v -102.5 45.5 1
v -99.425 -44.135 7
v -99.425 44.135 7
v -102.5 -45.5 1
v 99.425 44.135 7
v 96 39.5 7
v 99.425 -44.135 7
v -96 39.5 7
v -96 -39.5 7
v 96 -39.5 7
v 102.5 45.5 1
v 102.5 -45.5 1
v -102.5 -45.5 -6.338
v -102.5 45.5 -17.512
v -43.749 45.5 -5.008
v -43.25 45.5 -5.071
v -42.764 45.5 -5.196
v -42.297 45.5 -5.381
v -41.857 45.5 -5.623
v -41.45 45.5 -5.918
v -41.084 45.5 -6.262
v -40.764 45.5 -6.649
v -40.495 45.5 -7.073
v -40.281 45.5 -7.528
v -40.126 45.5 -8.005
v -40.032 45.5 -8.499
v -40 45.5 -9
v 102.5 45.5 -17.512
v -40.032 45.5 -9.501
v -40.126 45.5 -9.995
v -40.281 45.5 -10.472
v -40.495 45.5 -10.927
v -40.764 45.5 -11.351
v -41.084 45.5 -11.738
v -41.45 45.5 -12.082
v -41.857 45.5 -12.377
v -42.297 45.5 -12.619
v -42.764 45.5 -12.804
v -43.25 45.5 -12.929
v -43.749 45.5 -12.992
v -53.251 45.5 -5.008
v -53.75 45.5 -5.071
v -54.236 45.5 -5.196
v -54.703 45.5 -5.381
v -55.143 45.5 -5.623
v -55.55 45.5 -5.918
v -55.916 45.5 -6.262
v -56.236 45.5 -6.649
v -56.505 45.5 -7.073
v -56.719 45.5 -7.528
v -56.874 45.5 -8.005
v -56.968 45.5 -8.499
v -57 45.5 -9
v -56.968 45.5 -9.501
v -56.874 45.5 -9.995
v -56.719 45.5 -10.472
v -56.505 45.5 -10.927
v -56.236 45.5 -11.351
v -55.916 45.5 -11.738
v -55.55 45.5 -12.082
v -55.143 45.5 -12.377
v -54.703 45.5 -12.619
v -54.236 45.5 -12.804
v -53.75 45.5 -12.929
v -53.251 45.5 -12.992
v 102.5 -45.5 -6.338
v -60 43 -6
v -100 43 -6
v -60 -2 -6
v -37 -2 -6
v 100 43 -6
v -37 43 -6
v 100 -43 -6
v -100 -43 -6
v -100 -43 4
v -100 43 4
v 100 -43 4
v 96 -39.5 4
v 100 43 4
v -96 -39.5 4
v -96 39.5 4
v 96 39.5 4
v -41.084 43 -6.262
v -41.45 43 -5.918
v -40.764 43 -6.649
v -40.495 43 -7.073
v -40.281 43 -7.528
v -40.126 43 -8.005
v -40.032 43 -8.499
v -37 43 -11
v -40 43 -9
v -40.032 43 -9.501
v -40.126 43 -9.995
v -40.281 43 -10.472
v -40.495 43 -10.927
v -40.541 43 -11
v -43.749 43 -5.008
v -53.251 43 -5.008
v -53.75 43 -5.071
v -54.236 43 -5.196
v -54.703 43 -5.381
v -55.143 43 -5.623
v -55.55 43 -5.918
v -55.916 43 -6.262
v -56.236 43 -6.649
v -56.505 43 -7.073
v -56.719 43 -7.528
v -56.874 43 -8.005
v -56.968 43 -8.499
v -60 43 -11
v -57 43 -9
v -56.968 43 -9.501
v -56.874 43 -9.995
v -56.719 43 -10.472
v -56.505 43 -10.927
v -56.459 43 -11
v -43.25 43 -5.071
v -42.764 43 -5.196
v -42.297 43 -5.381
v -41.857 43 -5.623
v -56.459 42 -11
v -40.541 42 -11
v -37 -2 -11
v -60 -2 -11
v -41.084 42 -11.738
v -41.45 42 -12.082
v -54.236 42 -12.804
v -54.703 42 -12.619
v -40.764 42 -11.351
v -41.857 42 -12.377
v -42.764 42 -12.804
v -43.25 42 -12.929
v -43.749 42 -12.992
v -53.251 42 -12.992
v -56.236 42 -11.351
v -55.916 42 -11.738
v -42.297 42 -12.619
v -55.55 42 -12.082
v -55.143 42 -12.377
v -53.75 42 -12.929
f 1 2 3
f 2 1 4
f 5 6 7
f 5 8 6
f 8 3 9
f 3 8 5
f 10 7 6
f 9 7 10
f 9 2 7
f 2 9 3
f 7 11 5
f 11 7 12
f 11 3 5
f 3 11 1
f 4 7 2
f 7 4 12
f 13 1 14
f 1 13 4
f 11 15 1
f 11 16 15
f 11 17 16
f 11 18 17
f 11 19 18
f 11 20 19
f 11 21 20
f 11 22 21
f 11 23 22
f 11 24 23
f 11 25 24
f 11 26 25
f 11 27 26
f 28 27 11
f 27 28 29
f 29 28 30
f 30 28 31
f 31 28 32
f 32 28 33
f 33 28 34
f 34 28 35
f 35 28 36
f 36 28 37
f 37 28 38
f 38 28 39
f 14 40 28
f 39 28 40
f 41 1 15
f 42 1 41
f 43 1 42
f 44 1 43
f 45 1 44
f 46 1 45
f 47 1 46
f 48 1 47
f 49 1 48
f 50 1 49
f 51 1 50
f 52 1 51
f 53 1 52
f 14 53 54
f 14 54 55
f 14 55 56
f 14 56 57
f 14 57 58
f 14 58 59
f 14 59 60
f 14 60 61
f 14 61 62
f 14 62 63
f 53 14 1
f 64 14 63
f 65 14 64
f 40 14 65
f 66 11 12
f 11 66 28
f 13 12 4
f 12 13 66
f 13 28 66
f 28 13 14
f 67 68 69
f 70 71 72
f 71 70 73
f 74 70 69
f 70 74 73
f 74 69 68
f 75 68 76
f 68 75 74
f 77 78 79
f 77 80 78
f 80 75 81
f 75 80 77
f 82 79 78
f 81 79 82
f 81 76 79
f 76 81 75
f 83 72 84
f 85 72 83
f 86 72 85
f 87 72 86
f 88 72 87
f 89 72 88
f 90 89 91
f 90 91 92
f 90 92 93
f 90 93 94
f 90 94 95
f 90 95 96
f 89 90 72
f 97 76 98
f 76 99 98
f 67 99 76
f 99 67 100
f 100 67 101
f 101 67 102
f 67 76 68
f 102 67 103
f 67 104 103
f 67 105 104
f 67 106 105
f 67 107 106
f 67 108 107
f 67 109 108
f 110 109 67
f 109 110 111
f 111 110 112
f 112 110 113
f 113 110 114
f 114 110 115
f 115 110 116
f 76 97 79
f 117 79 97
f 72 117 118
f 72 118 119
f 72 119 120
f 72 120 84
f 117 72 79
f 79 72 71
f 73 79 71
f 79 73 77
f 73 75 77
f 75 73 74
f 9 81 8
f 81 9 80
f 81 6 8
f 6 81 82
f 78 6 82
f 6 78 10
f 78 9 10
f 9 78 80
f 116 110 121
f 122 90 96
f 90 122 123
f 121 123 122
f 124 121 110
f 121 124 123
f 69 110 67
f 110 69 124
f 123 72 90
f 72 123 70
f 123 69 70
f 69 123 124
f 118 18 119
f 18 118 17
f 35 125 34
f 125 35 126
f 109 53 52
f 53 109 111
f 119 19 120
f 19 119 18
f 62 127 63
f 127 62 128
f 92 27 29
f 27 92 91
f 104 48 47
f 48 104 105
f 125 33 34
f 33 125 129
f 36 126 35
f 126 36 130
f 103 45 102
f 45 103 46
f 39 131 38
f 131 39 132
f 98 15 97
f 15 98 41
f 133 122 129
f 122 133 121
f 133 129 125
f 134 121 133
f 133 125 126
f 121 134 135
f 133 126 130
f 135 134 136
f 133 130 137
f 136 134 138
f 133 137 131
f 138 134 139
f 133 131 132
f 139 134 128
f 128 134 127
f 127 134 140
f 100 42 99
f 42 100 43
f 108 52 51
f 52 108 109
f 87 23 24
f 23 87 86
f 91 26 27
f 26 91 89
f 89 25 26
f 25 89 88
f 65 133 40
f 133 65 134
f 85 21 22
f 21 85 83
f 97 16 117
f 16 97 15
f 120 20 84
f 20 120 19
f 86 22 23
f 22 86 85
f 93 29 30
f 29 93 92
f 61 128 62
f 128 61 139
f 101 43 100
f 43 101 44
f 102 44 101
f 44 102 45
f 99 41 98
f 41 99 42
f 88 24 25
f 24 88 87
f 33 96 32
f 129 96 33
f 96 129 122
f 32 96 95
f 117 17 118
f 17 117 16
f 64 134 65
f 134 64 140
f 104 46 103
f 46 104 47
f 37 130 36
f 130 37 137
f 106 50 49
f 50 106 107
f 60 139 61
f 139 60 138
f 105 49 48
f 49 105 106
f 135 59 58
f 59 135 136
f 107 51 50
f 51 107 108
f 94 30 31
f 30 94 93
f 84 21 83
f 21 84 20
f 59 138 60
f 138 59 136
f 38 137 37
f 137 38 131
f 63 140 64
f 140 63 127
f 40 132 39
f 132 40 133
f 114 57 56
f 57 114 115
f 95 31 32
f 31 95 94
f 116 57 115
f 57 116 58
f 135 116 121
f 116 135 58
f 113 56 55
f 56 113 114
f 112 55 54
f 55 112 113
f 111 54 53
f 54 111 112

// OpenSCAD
//wide board
kbw=200; //keypad width
kw=192; //key width
//narrow macro pad
//kbw=105; //keypad width
//kw=96; //key width

kbl=86; //keypad length
kbh=10; //keypad height
kbr=1  ; //keypad rounding
kl=79; //key length
kh=13; //key height
ucw = 23; //microcontroller width
ucl = 45; //micro length
uch = 5; //micro height
uci = 40; //micro inset

tol=0.2;//tolerance

angle=7;//keypad angle

cut=4; //cable cutout size
ccw=9;
cci=47;

module rounded(radius) {
    offset(r=radius) offset(delta=-radius, chamfer=false) children();
}

module chamfer(radius) {
    offset(delta=radius, chamfer=true) offset(delta=-radius, chamfer=false) children();
}

module keypad() 
{
    //keypad base
    linear_extrude(kbh) square([kbw, kbl], center=true);
     
    
    //keypad keys
    translate([0,0,kbh])
    linear_extrude(kh)
    square([kw, kl], center=true);
    
    //microcontroller 
    translate([uci - kbw/2 +ucw/2,(kbl-ucl)/2,-uch]) 
    linear_extrude(uch)
    square([ucw, ucl], center=true);
}

module base()
{
    minkowski() {
        cube([kbw-3, kbl-3, 10], center=true);
        sphere(6, $fn=100);
    }
}

module base2proj(center=true) {
   
        square([kbw+5, kbl+5], center=center);
   
}

module base2()
{
    difference() {
        translate([0,0,-1]) {
            translate([0,0,7]) linear_extrude(6, scale=0.97) base2proj();
            linear_extrude(7) base2proj();
            translate([0,0,0]) rotate([180,0,0]) linear_extrude(kbh*2-5) base2proj();
        }
        translate([0,0,-(kbh+7)]) rotate([-angle,0,0]) cube([kbw*2, kbl*2, kbh*2], center=true);
    }
    
}

module rotate_base2(mod)
{
    difference() {
        translate([0,0,-5]) {
            translate([0,0,10]) linear_extrude(6, scale=.95) base2proj();
            linear_extrude(10) base2proj();
            translate([0,0,0]) rotate([180,0,0]) linear_extrude(kbh*2-5, scale=.9) base2proj();
        }
        translate([0,0,-(kbh+10)]) rotate([0,mod,0]) cube([kbw*2, kbl*2, kbh*2], center=true);
    }
    
}

module cablecut(size) {
    translate([0,kbl/2+10,0])
    rotate([90,0,0]) 
    linear_extrude(kbl+20) {
        hull() {
            translate([-(kbw-20)/2,0,0]) circle(size, $fn=50);
            translate([(kbw-20)/2,0,0]) circle(size, $fn=50);
            }
    }
    translate([-(kbw/2+10),0,0])
    rotate([0,90,0]) 
    linear_extrude(kbw+20) {
        hull() {
            translate([0,-(kbl-20)/2,0]) circle(size, $fn=50);
            translate([0,(kbl-20)/2,0]) circle(size, $fn=50);
            }
    }
}

module cablecut2(size) {
    translate([0,kbl/2+10,0])
    rotate([90,0,0]) 
    linear_extrude(11) {
        hull() {
            translate([cci - kbw/2 +ccw,0,0]) circle(size, $fn=50);
            translate([cci - kbw/2,0,0]) circle(size, $fn=50);
            }
    }
 
    
}
module completecase() {
    translate([0,0,-5])
    difference() {
        base2();
        translate([0,0,-1]) keypad();
        translate([0,0,-4]) cablecut2(cut);
    }   
}



module bottom(cut=false) {
    difference() {
    intersection() {
        union(){
            translate([0,0,-(kbh+2)])cube([kbw*2, kbl*2, kbh*2], center=true);
            translate([0,0,-(0.75*kbh+2)]) linear_extrude(kbh) minkowski() {
                square([kbw, kbl], center=true);
                circle(kbr, $fn=20);
            }
            translate([0,0,0]) linear_extrude(1, scale=0.99) minkowski() {
                square([kbw, kbl], center=true);
                circle(kbr+0.25, $fn=20);
            }
        }
        children();
    }
    if(cut) {
    translate([0,0,-30]) linear_extrude(60){
translate([-kbw/2+3, -kbl/2+3,0]) {
    difference() {
        union() {
            for (i=[0:kbw/4:kbw-1]) {
                for (j=[0:kbl/2:kbl-1]) {
                    translate([i, j, 0]) square([kbw/4-6, kbl/2-6]);    
                }
            }
        }
        for (i=[0:kbw:kbw]) {
            
                translate([i-3, 0, 0]) circle(30,$fn=60);  
             
        
        }
       
                    }
                }
            }
        
            translate([-130,12,-9]) rotate([0,90,0])cylinder(r=2.5, h=50, $fn=30);
            translate([-130,20,-9]) rotate([0,90,0])cylinder(r=2.5, h=50, $fn=30);
            translate([-130,28,-9]) rotate([0,90,0])cylinder(r=2.5, h=50, $fn=30);
            translate([-130,36,-9]) rotate([0,90,0])cylinder(r=2.5, h=50, $fn=30);
            
            translate([80,12,-9]) rotate([0,90,0])cylinder(r=2.5, h=50, $fn=30);
            translate([80,20,-9]) rotate([0,90,0])cylinder(r=2.5, h=50, $fn=30);
            translate([80,28,-9]) rotate([0,90,0])cylinder(r=2.5, h=50, $fn=30);
            translate([80,36,-9]) rotate([0,90,0])cylinder(r=2.5, h=50, $fn=30);
            
            translate([-88,12,-9]) rotate([0,90,90])cylinder(r=2.5, h=50, $fn=30);
            translate([-80,12,-9]) rotate([0,90,90])cylinder(r=2.5, h=50, $fn=30);
            translate([-72,12,-9]) rotate([0,90,90])cylinder(r=2.5, h=50, $fn=30);
            translate([-64,12,-9]) rotate([0,90,90])cylinder(r=2.5, h=50, $fn=30);
            
            translate([-32,12,-9]) rotate([0,90,90])cylinder(r=2.5, h=50, $fn=30);
            translate([-24,12,-9]) rotate([0,90,90])cylinder(r=2.5, h=50, $fn=30);
            translate([-16,12,-9]) rotate([0,90,90])cylinder(r=2.5, h=50, $fn=30);
            translate([-8,12,-9]) rotate([0,90,90])cylinder(r=2.5, h=50, $fn=30);

            translate([8,12,-9]) rotate([0,90,90])cylinder(r=2.5, h=50, $fn=30);
            translate([16,12,-9]) rotate([0,90,90])cylinder(r=2.5, h=50, $fn=30);
            translate([24,12,-9]) rotate([0,90,90])cylinder(r=2.5, h=50, $fn=30);
            translate([32,12,-9]) rotate([0,90,90])cylinder(r=2.5, h=50, $fn=30);
            translate([40,12,-9]) rotate([0,90,90])cylinder(r=2.5, h=50, $fn=30);

            translate([64,12,-9]) rotate([0,90,90])cylinder(r=2.5, h=50, $fn=30);
            translate([72,12,-9]) rotate([0,90,90])cylinder(r=2.5, h=50, $fn=30);
            translate([80,12,-9]) rotate([0,90,90])cylinder(r=2.5, h=50, $fn=30);
            translate([88,12,-9]) rotate([0,90,90])cylinder(r=2.5, h=50, $fn=30);
        }

    }
}


module top() {
    rotate([180,0,0]) difference() {
        children();
        bottom() children();
        
    }
}

module handrest() {
    //I actually don't currently have a problem to solve here
}

//translate([-0.6*kbw,0,0])bottom(cut=true) completecase();
//translate([0.6*kbw,0,0]) top() completecase();    
//top() completecase();
//bottom(cut=true) completecase();
completecase();
//mat();
//bottom();
